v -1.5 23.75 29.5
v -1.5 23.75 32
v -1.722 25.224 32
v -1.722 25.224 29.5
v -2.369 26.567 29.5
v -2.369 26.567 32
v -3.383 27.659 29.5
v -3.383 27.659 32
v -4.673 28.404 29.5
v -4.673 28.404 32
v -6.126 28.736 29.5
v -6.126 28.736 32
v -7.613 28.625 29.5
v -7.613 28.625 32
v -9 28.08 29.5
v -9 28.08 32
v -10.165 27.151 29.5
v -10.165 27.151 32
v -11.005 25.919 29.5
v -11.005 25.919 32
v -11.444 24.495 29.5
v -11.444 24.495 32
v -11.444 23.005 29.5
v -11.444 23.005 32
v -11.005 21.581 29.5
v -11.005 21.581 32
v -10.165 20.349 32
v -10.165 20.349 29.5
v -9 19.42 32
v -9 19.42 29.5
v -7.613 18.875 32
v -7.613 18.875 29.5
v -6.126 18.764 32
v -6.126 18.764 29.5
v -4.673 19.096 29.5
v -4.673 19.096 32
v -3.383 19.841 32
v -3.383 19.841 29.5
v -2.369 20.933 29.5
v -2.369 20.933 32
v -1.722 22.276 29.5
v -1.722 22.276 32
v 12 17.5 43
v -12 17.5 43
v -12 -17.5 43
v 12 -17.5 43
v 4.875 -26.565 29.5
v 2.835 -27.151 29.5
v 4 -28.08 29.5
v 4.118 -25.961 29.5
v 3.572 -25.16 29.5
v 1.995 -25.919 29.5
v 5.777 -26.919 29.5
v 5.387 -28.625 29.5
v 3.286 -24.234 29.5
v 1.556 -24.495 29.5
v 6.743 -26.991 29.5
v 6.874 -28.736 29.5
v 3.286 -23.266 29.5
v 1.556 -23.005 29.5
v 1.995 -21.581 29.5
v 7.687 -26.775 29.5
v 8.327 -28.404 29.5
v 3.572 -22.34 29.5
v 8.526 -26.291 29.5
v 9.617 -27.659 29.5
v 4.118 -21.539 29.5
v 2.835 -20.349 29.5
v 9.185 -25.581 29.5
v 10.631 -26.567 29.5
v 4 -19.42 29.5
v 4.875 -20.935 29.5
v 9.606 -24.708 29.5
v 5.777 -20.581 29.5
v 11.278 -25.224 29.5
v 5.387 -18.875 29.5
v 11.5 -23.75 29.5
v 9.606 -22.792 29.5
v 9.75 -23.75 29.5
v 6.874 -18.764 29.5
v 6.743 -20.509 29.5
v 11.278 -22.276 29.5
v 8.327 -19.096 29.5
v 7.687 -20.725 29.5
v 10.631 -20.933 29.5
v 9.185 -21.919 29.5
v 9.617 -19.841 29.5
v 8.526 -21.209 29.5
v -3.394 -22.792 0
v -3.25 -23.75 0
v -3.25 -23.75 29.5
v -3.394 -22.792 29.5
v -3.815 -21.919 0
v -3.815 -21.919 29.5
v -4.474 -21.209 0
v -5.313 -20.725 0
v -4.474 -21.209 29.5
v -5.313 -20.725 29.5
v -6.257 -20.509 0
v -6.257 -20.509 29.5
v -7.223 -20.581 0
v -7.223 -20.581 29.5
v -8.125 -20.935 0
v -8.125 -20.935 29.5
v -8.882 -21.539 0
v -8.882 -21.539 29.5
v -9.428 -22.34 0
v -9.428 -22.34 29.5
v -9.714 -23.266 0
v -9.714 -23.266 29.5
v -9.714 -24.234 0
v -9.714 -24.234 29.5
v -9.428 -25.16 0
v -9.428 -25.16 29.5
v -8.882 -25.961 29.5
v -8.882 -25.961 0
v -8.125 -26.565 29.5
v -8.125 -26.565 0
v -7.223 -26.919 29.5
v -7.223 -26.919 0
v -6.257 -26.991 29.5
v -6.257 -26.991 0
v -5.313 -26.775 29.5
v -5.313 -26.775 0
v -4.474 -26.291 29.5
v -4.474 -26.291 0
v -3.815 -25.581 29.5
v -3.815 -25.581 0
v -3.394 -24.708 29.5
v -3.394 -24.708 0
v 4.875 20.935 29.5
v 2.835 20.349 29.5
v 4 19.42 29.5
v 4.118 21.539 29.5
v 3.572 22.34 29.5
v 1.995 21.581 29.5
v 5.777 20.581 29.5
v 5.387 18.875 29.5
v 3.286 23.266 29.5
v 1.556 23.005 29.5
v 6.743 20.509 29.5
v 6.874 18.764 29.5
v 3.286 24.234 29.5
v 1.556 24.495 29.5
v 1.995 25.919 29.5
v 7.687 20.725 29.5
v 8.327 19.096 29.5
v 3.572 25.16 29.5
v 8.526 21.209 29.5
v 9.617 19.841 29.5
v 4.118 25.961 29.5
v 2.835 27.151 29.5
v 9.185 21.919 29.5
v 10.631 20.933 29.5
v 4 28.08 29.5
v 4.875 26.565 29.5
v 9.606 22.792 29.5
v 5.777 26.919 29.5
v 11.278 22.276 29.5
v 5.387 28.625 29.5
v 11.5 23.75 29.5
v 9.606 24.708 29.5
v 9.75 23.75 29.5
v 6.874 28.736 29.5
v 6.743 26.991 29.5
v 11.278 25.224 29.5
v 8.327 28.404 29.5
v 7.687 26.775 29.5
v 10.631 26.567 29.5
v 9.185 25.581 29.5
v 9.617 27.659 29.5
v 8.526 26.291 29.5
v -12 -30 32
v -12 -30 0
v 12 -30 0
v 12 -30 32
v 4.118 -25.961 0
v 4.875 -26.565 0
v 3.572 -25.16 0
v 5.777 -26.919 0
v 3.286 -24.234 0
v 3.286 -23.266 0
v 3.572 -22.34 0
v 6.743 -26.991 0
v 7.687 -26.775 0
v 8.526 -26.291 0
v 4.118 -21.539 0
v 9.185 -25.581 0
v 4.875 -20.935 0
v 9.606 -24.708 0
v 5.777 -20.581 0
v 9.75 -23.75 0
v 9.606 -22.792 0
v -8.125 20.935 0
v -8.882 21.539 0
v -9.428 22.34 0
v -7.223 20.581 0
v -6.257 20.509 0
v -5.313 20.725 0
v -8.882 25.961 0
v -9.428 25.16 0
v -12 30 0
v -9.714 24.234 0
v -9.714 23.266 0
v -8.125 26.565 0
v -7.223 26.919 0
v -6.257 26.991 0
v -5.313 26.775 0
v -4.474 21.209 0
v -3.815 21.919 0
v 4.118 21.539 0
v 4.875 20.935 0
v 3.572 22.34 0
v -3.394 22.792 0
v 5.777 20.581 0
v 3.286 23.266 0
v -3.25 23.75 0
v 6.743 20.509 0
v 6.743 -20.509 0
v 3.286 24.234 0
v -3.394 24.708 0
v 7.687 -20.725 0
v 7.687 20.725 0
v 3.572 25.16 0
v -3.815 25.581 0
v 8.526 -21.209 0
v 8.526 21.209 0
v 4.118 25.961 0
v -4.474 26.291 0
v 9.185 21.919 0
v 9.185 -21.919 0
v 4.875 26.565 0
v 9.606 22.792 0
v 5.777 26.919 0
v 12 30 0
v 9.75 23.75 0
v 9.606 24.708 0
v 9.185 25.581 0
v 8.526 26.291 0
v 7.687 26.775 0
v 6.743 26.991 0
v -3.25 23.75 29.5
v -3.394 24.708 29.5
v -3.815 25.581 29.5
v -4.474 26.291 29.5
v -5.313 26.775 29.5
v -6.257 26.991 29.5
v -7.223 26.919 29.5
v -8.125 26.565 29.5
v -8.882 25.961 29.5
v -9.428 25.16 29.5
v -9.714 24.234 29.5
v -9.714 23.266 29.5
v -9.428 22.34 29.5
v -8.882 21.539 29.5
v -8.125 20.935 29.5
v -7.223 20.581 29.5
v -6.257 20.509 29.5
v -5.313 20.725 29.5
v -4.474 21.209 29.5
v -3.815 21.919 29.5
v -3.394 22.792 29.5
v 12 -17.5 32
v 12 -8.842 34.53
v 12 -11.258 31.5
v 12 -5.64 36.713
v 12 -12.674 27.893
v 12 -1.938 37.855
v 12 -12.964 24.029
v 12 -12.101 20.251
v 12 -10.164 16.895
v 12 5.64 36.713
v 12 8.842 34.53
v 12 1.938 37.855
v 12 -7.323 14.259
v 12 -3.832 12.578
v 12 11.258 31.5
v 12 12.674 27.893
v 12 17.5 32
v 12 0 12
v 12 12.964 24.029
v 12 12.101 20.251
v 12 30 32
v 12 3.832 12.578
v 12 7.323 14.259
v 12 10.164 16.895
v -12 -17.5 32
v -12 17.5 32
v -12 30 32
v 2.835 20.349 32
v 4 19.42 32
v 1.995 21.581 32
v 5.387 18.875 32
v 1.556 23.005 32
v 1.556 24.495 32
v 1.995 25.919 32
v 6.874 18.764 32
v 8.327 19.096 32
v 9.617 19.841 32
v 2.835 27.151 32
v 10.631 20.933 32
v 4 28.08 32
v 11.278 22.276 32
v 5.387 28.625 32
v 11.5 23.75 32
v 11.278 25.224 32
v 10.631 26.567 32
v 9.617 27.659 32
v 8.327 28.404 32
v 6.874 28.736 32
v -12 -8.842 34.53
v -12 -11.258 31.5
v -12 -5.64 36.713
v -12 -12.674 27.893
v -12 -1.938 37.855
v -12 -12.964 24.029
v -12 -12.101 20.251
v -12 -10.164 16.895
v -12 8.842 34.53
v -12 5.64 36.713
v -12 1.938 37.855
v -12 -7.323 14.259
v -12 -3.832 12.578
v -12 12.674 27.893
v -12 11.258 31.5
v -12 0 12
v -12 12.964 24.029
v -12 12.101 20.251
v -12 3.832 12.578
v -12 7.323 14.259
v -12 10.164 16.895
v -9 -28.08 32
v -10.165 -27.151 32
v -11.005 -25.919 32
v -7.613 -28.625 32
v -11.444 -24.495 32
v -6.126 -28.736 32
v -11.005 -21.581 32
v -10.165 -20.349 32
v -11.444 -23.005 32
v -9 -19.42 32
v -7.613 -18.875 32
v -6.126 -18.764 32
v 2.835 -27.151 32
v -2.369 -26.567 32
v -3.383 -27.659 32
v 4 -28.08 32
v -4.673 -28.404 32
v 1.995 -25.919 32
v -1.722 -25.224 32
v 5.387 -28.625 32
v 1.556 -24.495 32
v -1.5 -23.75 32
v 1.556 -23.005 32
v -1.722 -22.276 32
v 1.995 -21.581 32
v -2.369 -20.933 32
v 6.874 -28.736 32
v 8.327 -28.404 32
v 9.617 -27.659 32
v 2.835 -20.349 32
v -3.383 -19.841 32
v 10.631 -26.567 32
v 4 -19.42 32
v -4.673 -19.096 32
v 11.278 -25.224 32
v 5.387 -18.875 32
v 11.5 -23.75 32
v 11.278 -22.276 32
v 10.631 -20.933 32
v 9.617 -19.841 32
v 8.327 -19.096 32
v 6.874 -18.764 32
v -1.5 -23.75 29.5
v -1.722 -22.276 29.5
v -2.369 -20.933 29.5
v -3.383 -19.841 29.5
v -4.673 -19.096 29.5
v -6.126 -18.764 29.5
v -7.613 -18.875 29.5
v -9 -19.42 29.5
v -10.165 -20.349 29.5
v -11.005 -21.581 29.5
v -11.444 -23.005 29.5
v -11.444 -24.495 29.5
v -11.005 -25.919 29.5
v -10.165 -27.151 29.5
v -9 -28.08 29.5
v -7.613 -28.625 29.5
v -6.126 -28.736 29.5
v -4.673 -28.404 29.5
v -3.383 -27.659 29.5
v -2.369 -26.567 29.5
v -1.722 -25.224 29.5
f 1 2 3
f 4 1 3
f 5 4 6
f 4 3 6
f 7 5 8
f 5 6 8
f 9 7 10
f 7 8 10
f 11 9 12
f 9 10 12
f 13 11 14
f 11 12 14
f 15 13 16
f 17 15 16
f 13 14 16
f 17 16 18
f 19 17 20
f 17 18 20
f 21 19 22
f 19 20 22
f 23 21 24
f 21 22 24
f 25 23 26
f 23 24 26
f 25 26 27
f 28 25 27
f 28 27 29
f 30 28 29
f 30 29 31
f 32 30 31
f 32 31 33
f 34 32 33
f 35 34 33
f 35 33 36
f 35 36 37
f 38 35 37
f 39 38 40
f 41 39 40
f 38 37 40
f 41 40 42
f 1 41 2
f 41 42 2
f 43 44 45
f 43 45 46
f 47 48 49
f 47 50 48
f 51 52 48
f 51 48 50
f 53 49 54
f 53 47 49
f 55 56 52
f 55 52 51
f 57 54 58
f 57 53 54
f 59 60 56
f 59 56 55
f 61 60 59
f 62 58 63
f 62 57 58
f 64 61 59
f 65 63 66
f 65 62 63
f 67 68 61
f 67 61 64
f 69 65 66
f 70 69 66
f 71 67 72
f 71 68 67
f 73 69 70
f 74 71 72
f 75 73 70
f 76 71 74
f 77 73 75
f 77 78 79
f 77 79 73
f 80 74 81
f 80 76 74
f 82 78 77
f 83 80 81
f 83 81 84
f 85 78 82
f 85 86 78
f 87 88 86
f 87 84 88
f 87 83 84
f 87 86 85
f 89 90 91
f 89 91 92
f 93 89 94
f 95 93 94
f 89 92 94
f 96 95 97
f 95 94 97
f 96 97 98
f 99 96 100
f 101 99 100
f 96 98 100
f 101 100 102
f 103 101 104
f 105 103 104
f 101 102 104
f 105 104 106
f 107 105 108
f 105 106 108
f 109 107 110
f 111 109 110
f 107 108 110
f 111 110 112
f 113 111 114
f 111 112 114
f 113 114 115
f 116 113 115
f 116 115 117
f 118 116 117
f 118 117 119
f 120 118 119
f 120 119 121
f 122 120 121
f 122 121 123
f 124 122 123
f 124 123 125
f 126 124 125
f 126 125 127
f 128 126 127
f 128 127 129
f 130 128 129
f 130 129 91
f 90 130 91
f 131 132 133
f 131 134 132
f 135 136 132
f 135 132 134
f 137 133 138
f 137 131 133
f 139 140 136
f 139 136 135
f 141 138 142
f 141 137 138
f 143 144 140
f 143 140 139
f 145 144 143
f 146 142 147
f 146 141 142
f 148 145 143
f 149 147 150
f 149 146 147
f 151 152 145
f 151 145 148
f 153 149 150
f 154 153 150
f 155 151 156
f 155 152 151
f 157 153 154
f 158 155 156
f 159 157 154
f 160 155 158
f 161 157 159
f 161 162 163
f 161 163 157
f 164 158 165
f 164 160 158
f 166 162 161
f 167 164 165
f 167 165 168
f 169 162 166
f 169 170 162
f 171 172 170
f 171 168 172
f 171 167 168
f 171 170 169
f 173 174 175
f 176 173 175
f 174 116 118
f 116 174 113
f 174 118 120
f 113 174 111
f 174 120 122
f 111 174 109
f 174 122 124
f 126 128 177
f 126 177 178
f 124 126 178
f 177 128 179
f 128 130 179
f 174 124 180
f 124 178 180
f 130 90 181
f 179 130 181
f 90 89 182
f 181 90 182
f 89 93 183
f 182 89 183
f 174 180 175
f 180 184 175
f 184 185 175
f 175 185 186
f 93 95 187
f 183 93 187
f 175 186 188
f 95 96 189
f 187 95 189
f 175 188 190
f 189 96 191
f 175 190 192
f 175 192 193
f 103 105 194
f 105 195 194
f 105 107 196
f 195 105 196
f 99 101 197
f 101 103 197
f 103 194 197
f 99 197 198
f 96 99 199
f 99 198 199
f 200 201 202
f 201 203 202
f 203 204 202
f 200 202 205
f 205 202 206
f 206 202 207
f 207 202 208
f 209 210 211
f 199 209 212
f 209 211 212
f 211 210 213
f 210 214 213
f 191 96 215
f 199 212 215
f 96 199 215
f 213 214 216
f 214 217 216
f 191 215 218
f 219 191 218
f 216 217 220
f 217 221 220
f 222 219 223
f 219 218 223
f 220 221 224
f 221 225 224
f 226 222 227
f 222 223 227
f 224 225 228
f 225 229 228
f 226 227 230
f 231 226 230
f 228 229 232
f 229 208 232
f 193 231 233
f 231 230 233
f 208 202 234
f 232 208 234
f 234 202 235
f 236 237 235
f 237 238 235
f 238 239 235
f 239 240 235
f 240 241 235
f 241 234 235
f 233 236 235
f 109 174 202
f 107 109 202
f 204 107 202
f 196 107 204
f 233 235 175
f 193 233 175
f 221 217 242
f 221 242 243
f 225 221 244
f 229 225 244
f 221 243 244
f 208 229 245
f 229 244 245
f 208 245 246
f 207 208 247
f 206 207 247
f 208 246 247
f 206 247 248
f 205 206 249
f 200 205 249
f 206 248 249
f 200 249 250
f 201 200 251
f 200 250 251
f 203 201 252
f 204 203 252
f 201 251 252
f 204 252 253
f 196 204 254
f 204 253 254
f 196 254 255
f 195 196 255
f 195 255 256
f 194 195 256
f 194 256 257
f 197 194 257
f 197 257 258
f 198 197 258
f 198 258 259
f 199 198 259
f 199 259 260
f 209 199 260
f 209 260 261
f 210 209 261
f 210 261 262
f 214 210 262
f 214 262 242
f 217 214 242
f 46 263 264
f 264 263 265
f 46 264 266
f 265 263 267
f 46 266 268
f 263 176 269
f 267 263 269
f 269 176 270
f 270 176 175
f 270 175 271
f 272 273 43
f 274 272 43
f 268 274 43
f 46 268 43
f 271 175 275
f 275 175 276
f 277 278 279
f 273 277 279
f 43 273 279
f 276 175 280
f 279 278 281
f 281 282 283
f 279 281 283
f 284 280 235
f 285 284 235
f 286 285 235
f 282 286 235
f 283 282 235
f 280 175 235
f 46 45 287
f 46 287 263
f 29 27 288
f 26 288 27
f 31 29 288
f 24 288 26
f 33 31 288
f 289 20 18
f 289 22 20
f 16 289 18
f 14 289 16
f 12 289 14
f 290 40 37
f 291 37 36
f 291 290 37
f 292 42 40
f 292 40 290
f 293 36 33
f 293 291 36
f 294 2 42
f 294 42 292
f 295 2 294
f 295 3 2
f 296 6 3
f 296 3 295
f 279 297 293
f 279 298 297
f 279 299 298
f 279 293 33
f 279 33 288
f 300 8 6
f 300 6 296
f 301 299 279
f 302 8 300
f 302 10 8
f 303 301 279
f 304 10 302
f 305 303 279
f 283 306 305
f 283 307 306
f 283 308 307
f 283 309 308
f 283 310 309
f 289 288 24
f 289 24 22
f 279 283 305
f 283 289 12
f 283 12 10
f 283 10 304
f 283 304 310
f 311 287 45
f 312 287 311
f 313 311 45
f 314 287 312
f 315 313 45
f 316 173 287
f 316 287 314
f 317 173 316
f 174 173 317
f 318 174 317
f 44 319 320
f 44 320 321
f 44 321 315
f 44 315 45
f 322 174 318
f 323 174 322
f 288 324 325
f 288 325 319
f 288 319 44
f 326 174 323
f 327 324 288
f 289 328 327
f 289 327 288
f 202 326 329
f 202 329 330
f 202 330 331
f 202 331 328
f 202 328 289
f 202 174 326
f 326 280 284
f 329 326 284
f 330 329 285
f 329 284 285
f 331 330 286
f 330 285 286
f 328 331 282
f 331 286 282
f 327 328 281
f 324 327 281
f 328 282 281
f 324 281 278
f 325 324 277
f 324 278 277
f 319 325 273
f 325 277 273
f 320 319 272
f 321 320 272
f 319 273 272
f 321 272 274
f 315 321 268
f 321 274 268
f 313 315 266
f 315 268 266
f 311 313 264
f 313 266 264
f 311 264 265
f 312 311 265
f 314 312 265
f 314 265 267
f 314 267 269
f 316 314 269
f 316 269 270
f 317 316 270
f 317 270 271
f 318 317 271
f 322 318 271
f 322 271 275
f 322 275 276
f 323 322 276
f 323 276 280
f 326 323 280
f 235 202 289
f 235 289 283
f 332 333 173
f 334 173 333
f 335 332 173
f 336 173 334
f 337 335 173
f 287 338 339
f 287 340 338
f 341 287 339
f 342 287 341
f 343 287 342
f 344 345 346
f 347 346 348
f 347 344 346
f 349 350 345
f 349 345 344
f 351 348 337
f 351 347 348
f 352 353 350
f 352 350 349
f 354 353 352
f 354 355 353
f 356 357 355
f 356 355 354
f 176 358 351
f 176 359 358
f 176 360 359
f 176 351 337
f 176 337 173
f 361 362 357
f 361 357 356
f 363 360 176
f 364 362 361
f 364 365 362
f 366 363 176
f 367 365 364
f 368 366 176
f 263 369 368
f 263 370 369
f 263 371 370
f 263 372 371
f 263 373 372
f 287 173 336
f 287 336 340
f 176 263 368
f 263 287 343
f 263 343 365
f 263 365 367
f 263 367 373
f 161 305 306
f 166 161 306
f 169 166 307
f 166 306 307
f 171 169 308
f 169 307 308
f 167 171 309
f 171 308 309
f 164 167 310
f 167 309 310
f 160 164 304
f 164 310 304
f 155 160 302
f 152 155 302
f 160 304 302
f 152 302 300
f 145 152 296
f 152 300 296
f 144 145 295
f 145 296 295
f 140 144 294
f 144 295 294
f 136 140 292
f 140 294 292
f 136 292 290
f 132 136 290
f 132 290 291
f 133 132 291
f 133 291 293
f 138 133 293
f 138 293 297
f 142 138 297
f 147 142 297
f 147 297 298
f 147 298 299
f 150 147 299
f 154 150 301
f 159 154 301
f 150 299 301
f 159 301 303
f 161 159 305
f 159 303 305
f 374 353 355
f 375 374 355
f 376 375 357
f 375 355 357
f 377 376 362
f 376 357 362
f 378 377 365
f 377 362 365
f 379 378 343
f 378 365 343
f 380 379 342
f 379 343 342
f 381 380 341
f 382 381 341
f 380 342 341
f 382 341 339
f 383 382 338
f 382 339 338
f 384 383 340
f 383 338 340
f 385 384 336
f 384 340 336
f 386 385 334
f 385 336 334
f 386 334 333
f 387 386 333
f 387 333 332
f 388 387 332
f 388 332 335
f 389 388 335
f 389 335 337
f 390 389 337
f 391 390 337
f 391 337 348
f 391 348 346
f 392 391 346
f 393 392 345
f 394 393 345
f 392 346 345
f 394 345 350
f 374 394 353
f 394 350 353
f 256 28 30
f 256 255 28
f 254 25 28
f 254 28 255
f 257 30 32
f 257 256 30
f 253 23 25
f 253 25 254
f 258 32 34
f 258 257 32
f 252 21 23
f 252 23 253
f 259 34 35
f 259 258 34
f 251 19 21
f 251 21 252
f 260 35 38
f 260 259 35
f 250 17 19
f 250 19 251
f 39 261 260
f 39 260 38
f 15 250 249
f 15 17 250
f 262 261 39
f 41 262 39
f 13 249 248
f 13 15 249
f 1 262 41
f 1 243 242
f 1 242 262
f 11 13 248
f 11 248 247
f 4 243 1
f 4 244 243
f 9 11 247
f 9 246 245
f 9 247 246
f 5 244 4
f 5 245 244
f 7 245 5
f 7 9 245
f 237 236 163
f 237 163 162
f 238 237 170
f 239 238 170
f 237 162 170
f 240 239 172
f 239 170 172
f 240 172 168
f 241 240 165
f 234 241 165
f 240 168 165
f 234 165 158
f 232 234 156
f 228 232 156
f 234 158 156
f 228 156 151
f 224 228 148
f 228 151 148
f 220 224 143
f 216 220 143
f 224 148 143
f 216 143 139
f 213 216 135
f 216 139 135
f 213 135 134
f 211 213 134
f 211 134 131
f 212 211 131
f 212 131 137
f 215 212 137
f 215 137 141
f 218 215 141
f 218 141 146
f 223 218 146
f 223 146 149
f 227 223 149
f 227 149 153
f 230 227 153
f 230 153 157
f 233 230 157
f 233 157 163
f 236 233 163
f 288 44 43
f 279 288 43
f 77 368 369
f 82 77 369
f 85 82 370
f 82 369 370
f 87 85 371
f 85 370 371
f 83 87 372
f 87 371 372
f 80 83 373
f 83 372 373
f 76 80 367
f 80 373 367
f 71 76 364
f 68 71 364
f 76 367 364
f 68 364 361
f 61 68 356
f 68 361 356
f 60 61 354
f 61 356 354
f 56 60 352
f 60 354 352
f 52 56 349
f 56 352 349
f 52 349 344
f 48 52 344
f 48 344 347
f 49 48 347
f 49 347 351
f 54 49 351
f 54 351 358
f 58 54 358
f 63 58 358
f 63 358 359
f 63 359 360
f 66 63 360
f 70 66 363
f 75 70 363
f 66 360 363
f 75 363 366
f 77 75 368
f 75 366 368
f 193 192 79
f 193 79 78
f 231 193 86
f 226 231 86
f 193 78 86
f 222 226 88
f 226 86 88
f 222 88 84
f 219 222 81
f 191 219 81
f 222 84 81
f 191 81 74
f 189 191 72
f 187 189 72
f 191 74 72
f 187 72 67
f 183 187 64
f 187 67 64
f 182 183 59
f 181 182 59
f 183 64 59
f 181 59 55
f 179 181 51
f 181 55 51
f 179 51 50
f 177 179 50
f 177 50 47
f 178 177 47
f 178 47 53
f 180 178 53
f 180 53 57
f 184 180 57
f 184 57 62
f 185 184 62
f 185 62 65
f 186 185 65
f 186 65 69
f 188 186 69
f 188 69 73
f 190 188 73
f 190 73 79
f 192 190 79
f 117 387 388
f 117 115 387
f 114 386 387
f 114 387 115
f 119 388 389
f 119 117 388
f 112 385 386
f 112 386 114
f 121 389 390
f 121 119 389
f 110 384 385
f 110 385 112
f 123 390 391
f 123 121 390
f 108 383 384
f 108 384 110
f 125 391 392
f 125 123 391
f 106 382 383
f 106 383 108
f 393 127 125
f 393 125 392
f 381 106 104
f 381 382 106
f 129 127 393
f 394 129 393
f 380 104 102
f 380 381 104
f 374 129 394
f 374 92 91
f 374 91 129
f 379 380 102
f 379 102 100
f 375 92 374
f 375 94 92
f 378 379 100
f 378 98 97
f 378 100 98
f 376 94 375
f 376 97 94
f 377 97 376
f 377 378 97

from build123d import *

# Parameters (mm, degrees)
SKETCH1_W           = 24
SKETCH1_H           = 60
BOSS_EXTRUDE1_DEPTH = 43
SKETCH2_W           = 24
SKETCH2_H           = 12.5
CUT_EXTRUDE1_DEPTH  = 11
SKETCH3_R           = 3.25
CUT_EXTRUDE2_DEPTH  = 33
SKETCH4_R           = 5
CUT_EXTRUDE3_DEPTH  = 2.5
SKETCH5_R           = 13
CUT_EXTRUDE4_DEPTH  = 25


with BuildPart() as part:
    # Sketch1 → Boss-Extrude1 (new body)
    with BuildSketch(Plane.XY):
        Rectangle(SKETCH1_W, SKETCH1_H)
    extrude(amount=BOSS_EXTRUDE1_DEPTH)

    # Sketch2 → Cut-Extrude1 (cut)
    with BuildSketch(Plane.XY.offset(43)):
        with Locations((0, -23.75)):
            Rectangle(SKETCH2_W, SKETCH2_H)
        with Locations((0, 23.75)):
            Rectangle(SKETCH2_W, SKETCH2_H)
    extrude(amount=-CUT_EXTRUDE1_DEPTH, mode=Mode.SUBTRACT)

    # Sketch3 → Cut-Extrude2 (cut, through all)
    with BuildSketch(Plane.XY.offset(32)):
        with Locations((-6.5, -23.75)):
            Circle(SKETCH3_R)
        with Locations((6.5, -23.75)):
            Circle(SKETCH3_R)
        with Locations((-6.5, 23.75)):
            Circle(SKETCH3_R)
        with Locations((6.5, 23.75)):
            Circle(SKETCH3_R)
    extrude(amount=-CUT_EXTRUDE2_DEPTH, mode=Mode.SUBTRACT)

    # Sketch4 → Cut-Extrude3 (cut)
    with BuildSketch(Plane.XY.offset(32)):
        with Locations((-6.5, 23.75)):
            Circle(SKETCH4_R)
        with Locations((6.5, 23.75)):
            Circle(SKETCH4_R)
        with Locations((-6.5, -23.75)):
            Circle(SKETCH4_R)
        with Locations((6.5, -23.75)):
            Circle(SKETCH4_R)
    extrude(amount=-CUT_EXTRUDE3_DEPTH, mode=Mode.SUBTRACT)

    # Sketch5 → Cut-Extrude4 (cut, through all)
    with BuildSketch(Plane(origin=(12, 0, 0), x_dir=(0, 0, -1), z_dir=(1, 0, 0))):
        with Locations((-25, 0)):
            Circle(SKETCH5_R)
    extrude(amount=-CUT_EXTRUDE4_DEPTH, mode=Mode.SUBTRACT)


solid = part.part
